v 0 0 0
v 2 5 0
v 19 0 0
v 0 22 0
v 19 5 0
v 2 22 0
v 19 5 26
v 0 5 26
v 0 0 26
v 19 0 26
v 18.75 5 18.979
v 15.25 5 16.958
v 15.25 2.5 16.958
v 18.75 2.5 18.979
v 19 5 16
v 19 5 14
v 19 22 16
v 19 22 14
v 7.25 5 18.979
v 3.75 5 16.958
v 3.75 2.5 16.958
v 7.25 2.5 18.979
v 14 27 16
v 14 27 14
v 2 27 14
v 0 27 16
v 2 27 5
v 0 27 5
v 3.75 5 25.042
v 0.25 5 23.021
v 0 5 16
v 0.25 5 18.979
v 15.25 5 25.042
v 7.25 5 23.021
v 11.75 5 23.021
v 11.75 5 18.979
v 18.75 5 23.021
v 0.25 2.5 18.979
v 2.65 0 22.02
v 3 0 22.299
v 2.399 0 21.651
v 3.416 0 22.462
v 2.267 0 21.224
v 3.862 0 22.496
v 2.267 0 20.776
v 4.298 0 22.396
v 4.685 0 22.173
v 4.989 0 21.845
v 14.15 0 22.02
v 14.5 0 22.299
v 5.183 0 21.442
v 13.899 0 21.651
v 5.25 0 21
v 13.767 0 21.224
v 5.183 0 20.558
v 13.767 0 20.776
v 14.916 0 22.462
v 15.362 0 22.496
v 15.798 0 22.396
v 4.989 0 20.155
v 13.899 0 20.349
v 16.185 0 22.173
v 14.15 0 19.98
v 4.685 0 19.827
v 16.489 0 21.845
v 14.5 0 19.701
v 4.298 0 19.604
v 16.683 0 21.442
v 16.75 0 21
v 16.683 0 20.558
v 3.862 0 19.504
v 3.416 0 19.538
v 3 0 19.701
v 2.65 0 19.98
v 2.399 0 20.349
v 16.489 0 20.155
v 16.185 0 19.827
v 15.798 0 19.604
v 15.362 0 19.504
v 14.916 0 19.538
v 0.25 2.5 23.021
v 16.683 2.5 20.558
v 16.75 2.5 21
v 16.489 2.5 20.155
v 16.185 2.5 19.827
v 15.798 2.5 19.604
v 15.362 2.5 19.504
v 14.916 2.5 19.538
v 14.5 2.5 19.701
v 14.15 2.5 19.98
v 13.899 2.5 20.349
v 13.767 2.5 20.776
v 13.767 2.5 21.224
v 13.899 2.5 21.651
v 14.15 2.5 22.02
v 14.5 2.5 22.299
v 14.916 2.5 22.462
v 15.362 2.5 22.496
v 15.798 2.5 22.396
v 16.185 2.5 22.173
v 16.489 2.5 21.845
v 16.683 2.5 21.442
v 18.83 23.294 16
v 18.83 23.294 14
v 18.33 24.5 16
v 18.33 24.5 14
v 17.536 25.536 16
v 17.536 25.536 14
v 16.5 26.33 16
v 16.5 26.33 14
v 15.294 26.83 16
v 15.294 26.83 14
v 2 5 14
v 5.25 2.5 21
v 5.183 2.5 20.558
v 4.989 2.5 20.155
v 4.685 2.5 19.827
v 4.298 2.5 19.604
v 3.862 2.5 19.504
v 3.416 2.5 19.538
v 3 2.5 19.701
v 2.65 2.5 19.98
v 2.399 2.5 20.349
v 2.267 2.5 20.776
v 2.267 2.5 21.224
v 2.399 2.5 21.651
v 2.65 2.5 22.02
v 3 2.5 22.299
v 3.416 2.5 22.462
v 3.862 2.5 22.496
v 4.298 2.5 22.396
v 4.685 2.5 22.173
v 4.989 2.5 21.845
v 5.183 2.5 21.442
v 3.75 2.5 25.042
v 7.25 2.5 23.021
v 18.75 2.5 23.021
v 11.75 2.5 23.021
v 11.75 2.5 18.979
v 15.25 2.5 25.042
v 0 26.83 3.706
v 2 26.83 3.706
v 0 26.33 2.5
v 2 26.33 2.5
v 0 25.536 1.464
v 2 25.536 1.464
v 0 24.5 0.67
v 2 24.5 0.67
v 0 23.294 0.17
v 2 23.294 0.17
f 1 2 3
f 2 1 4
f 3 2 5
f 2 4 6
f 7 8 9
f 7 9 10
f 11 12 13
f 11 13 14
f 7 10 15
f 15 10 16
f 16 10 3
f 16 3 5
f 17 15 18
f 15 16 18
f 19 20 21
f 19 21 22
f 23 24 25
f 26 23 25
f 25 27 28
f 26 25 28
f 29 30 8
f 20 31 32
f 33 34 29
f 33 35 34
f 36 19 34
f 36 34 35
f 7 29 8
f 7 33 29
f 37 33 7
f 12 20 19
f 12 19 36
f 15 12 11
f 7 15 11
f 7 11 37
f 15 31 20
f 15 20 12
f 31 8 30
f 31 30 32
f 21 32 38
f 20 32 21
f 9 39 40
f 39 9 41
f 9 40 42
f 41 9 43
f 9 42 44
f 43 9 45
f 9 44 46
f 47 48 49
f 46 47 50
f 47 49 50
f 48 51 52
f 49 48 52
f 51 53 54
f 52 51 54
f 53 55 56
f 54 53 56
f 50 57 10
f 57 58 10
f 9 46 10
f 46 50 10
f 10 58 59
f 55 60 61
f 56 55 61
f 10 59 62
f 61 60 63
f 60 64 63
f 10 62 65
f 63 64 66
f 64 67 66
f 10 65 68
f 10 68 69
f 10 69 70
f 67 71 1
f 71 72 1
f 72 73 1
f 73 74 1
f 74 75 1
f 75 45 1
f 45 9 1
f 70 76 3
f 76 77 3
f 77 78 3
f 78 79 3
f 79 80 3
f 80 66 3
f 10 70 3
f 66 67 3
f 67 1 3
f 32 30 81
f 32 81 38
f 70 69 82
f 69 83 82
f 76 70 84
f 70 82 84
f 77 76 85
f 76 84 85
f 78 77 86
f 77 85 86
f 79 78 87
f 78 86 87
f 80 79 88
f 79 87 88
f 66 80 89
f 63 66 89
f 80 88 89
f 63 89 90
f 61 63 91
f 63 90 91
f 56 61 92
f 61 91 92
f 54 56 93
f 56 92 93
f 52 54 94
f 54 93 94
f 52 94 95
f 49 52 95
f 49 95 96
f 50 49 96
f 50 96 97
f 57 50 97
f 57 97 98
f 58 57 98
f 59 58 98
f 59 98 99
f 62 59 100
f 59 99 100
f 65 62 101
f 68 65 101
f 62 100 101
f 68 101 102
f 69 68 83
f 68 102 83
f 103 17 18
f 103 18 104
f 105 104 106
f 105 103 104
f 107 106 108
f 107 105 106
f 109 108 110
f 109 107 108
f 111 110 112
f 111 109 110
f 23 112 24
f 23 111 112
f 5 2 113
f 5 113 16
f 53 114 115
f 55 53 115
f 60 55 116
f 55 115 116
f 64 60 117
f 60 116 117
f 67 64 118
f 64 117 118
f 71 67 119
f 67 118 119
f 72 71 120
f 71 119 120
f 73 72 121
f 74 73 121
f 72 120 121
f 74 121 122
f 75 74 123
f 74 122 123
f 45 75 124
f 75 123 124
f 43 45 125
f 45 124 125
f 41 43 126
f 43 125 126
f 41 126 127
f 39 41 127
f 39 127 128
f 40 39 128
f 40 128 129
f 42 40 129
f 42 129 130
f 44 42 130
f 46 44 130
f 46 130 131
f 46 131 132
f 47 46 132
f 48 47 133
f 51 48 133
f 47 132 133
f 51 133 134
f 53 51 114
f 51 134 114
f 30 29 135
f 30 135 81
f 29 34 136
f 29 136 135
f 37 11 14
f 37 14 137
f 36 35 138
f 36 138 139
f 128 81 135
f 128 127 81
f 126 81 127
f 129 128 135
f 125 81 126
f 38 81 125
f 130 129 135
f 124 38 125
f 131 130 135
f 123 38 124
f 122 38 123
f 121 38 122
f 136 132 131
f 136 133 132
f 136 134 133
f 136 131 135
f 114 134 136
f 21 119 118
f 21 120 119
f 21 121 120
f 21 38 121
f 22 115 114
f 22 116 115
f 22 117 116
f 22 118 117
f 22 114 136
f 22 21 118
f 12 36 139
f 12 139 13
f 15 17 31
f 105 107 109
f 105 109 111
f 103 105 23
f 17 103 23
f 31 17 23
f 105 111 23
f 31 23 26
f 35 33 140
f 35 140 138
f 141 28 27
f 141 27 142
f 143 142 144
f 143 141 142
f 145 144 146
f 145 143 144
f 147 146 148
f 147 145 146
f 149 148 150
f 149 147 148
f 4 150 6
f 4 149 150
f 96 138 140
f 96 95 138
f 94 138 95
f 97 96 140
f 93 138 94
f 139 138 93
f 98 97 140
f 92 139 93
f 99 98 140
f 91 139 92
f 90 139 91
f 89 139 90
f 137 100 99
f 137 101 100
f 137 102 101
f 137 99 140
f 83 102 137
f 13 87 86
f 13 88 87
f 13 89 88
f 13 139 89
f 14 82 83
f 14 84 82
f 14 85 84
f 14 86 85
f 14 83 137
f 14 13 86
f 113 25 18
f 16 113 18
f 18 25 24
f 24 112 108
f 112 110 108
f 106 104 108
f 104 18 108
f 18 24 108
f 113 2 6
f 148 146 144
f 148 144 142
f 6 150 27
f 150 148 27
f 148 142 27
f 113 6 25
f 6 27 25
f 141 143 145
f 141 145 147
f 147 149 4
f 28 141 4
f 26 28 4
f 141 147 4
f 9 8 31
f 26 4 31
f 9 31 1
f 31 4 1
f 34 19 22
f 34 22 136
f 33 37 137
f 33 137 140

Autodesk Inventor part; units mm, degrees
ref_plane "YZ Plane" through (0, 0, 0) normal (1, 0, 0) x (0, 1, 0)
ref_plane "XZ Plane" through (0, 0, 0) normal (0, 1, 0) x (-1, 0, 0)
ref_plane "XY Plane" through (0, 0, 0) normal (0, 0, 1) x (1, 0, 0)
sketch "Esquisse1" plane through (0, 0, 0) normal (0, 0, 1) x (1, 0, 0)
  line L0 (0, 0) -> (19, 0)
  line L1 (19, 0) -> (19, 27)
  line L2 (19, 27) -> (0, 27)
  line L3 (0, 27) -> (0, 0)
  dimension "d0" = 27
  dimension "d1" = 19
extrude "Extrusion1" add sketch "Esquisse1" along normal blind 26
sketch "Esquisse2" plane through (0, 27, 0) normal (0, 1, 0) x (1, 0, 0)
  line L0 (19, 0) -> (2, 0)
  line L1 (2, 0) -> (2, -14)
  line L2 (2, -14) -> (19, -14)
  line L3 (19, -14) -> (19, 0)
  line L4 (0, 0) -> (0, -26) projected
  line L5 (19, 0) -> (19, -26) projected
  line L6 (0, -26) -> (19, -26)
  line L7 (19, -26) -> (19, -16)
  line L8 (19, -16) -> (0, -16)
  line L9 (0, -16) -> (0, -26)
  dimension "d4" = 2
  dimension "d5" = 2
  dimension "d6" = 14
  dimension "d7" = 10
extrude "Extrusion2" cut sketch "Esquisse2" against normal blind 22
sketch "Esquisse3" plane through (0, 5, 0) normal (0, 1, 0) x (1, 0, 0)
  circle A0 centre (3.75, -21) radius 1.5
  circle A1 centre (15.25, -21) radius 1.5
  line L0 (0, -16) -> (19, -16) projected
  line L1 (19, -16) -> (19, -26) projected
  line L2 (0, -26) -> (0, -16) projected
  point P0 (0, 0)
  dimension "d10" = 3
  dimension "d11" = 5
  dimension "d12" = 11.5
  dimension "d13" = 19
  dimension "d14" = 3.75
extrude "Extrusion3" cut sketch "Esquisse3" against normal through all
sketch "Esquisse4" plane through (0, 5, 0) normal (0, 1, 0) x (1, 0, 0)
  circle A0 centre (3.75, -21) radius 1.5 projected
  line L0 (3.75, -16.9585) -> (7.25, -18.9793)
  line L1 (7.25, -18.9793) -> (7.25, -23.0207)
  line L2 (7.25, -23.0207) -> (3.75, -25.0415)
  line L3 (3.75, -25.0415) -> (0.25, -23.0207)
  line L4 (0.25, -23.0207) -> (0.25, -18.9793)
  line L5 (0.25, -18.9793) -> (3.75, -16.9585)
  circle A1 centre (15.25, -21) radius 1.5 projected
  line L6 (15.25, -16.9585) -> (18.75, -18.9793)
  line L7 (18.75, -18.9793) -> (18.75, -23.0207)
  line L8 (18.75, -23.0207) -> (15.25, -25.0415)
  line L9 (15.25, -25.0415) -> (11.75, -23.0207)
  line L10 (11.75, -23.0207) -> (11.75, -18.9793)
  line L11 (11.75, -18.9793) -> (15.25, -16.9585)
  point P0 (0, 0)
  dimension "d17" = 7
extrude "Extrusion4" cut sketch "Esquisse4" against normal blind 2.5
fillet "Congé1" radius 5 2 edges at (1, 27, 0) (19, 27, 15)
equation "\"d14\" = -0.5 * d12 + 0.5 * d13"
properties part number "EquerreBatterieGauche" material "Plastique ABS"
